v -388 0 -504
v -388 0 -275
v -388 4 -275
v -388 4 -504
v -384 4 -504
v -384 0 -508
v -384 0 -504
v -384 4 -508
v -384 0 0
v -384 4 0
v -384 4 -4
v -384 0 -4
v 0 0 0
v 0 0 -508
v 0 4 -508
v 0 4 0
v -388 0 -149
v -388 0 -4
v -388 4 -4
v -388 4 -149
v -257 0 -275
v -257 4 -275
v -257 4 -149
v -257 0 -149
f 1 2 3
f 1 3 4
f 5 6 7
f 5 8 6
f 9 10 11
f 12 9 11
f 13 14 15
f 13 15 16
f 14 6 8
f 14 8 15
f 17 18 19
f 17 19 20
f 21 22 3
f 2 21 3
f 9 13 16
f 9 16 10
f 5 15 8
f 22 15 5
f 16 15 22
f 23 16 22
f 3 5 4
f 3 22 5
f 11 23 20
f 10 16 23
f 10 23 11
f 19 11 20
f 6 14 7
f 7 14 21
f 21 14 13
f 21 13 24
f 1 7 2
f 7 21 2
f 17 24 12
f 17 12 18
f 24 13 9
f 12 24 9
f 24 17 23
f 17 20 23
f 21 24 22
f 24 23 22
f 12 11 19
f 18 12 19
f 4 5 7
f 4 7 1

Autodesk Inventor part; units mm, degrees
ref_plane "YZ Plane" through (0, 0, 0) normal (1, 0, 0) x (0, 1, 0)
ref_plane "XZ Plane" through (0, 0, 0) normal (0, 1, 0) x (-1, 0, 0)
ref_plane "XY Plane" through (0, 0, 0) normal (0, 0, 1) x (1, 0, 0)
sketch "Эскиз1" plane through (0, 0, 0) normal (0, 1, 0) x (-1, 0, 0)
  line L0 (0, 0) -> (388, 0)
  line L1 (388, 0) -> (388, -508)
  line L2 (388, -508) -> (0, -508)
  line L3 (0, -508) -> (0, 0)
  dimension "d0" = 388
  dimension "d1" = 508
extrude "Выдавливание1" add sketch "Эскиз1" along normal blind 4
sketch "Эскиз2" plane through (0, 4, 0) normal (0, 1, 0) x (1, 0, 0)
  line L0 (-388, 508) -> (-388, 0) projected
  line L1 (-388, 149) -> (-257, 149)
  line L2 (-257, 149) -> (-257, 275)
  line L3 (-257, 275) -> (-388, 275)
  line L4 (-388, 275) -> (-388, 149)
  line L5 (0, 0) -> (-5, 0)
  line L6 (-388, 0) -> (0, 0) projected
  line L7 (-388, 0) -> (-384, 0)
  line L8 (-384, 0) -> (-384, 4)
  line L9 (-384, 4) -> (-388, 4)
  line L10 (-388, 4) -> (-388, 0)
  line L11 (0, 508) -> (-388, 508) projected
  line L12 (-388, 508) -> (-384, 508)
  line L13 (-384, 508) -> (-384, 504)
  line L14 (-384, 504) -> (-388, 504)
  line L15 (-388, 504) -> (-388, 508)
  point P0 (-388, 275)
  dimension "d4" = 126
  dimension "d5" = 131
  dimension "d13" = 149
  dimension "d14" = 4
  dimension "d15" = 4
  dimension "d16" = 4
  dimension "d17" = 4
extrude "Выдавливание3" cut sketch "Эскиз2" against normal blind 10
properties part number "MountingWallSide2"
